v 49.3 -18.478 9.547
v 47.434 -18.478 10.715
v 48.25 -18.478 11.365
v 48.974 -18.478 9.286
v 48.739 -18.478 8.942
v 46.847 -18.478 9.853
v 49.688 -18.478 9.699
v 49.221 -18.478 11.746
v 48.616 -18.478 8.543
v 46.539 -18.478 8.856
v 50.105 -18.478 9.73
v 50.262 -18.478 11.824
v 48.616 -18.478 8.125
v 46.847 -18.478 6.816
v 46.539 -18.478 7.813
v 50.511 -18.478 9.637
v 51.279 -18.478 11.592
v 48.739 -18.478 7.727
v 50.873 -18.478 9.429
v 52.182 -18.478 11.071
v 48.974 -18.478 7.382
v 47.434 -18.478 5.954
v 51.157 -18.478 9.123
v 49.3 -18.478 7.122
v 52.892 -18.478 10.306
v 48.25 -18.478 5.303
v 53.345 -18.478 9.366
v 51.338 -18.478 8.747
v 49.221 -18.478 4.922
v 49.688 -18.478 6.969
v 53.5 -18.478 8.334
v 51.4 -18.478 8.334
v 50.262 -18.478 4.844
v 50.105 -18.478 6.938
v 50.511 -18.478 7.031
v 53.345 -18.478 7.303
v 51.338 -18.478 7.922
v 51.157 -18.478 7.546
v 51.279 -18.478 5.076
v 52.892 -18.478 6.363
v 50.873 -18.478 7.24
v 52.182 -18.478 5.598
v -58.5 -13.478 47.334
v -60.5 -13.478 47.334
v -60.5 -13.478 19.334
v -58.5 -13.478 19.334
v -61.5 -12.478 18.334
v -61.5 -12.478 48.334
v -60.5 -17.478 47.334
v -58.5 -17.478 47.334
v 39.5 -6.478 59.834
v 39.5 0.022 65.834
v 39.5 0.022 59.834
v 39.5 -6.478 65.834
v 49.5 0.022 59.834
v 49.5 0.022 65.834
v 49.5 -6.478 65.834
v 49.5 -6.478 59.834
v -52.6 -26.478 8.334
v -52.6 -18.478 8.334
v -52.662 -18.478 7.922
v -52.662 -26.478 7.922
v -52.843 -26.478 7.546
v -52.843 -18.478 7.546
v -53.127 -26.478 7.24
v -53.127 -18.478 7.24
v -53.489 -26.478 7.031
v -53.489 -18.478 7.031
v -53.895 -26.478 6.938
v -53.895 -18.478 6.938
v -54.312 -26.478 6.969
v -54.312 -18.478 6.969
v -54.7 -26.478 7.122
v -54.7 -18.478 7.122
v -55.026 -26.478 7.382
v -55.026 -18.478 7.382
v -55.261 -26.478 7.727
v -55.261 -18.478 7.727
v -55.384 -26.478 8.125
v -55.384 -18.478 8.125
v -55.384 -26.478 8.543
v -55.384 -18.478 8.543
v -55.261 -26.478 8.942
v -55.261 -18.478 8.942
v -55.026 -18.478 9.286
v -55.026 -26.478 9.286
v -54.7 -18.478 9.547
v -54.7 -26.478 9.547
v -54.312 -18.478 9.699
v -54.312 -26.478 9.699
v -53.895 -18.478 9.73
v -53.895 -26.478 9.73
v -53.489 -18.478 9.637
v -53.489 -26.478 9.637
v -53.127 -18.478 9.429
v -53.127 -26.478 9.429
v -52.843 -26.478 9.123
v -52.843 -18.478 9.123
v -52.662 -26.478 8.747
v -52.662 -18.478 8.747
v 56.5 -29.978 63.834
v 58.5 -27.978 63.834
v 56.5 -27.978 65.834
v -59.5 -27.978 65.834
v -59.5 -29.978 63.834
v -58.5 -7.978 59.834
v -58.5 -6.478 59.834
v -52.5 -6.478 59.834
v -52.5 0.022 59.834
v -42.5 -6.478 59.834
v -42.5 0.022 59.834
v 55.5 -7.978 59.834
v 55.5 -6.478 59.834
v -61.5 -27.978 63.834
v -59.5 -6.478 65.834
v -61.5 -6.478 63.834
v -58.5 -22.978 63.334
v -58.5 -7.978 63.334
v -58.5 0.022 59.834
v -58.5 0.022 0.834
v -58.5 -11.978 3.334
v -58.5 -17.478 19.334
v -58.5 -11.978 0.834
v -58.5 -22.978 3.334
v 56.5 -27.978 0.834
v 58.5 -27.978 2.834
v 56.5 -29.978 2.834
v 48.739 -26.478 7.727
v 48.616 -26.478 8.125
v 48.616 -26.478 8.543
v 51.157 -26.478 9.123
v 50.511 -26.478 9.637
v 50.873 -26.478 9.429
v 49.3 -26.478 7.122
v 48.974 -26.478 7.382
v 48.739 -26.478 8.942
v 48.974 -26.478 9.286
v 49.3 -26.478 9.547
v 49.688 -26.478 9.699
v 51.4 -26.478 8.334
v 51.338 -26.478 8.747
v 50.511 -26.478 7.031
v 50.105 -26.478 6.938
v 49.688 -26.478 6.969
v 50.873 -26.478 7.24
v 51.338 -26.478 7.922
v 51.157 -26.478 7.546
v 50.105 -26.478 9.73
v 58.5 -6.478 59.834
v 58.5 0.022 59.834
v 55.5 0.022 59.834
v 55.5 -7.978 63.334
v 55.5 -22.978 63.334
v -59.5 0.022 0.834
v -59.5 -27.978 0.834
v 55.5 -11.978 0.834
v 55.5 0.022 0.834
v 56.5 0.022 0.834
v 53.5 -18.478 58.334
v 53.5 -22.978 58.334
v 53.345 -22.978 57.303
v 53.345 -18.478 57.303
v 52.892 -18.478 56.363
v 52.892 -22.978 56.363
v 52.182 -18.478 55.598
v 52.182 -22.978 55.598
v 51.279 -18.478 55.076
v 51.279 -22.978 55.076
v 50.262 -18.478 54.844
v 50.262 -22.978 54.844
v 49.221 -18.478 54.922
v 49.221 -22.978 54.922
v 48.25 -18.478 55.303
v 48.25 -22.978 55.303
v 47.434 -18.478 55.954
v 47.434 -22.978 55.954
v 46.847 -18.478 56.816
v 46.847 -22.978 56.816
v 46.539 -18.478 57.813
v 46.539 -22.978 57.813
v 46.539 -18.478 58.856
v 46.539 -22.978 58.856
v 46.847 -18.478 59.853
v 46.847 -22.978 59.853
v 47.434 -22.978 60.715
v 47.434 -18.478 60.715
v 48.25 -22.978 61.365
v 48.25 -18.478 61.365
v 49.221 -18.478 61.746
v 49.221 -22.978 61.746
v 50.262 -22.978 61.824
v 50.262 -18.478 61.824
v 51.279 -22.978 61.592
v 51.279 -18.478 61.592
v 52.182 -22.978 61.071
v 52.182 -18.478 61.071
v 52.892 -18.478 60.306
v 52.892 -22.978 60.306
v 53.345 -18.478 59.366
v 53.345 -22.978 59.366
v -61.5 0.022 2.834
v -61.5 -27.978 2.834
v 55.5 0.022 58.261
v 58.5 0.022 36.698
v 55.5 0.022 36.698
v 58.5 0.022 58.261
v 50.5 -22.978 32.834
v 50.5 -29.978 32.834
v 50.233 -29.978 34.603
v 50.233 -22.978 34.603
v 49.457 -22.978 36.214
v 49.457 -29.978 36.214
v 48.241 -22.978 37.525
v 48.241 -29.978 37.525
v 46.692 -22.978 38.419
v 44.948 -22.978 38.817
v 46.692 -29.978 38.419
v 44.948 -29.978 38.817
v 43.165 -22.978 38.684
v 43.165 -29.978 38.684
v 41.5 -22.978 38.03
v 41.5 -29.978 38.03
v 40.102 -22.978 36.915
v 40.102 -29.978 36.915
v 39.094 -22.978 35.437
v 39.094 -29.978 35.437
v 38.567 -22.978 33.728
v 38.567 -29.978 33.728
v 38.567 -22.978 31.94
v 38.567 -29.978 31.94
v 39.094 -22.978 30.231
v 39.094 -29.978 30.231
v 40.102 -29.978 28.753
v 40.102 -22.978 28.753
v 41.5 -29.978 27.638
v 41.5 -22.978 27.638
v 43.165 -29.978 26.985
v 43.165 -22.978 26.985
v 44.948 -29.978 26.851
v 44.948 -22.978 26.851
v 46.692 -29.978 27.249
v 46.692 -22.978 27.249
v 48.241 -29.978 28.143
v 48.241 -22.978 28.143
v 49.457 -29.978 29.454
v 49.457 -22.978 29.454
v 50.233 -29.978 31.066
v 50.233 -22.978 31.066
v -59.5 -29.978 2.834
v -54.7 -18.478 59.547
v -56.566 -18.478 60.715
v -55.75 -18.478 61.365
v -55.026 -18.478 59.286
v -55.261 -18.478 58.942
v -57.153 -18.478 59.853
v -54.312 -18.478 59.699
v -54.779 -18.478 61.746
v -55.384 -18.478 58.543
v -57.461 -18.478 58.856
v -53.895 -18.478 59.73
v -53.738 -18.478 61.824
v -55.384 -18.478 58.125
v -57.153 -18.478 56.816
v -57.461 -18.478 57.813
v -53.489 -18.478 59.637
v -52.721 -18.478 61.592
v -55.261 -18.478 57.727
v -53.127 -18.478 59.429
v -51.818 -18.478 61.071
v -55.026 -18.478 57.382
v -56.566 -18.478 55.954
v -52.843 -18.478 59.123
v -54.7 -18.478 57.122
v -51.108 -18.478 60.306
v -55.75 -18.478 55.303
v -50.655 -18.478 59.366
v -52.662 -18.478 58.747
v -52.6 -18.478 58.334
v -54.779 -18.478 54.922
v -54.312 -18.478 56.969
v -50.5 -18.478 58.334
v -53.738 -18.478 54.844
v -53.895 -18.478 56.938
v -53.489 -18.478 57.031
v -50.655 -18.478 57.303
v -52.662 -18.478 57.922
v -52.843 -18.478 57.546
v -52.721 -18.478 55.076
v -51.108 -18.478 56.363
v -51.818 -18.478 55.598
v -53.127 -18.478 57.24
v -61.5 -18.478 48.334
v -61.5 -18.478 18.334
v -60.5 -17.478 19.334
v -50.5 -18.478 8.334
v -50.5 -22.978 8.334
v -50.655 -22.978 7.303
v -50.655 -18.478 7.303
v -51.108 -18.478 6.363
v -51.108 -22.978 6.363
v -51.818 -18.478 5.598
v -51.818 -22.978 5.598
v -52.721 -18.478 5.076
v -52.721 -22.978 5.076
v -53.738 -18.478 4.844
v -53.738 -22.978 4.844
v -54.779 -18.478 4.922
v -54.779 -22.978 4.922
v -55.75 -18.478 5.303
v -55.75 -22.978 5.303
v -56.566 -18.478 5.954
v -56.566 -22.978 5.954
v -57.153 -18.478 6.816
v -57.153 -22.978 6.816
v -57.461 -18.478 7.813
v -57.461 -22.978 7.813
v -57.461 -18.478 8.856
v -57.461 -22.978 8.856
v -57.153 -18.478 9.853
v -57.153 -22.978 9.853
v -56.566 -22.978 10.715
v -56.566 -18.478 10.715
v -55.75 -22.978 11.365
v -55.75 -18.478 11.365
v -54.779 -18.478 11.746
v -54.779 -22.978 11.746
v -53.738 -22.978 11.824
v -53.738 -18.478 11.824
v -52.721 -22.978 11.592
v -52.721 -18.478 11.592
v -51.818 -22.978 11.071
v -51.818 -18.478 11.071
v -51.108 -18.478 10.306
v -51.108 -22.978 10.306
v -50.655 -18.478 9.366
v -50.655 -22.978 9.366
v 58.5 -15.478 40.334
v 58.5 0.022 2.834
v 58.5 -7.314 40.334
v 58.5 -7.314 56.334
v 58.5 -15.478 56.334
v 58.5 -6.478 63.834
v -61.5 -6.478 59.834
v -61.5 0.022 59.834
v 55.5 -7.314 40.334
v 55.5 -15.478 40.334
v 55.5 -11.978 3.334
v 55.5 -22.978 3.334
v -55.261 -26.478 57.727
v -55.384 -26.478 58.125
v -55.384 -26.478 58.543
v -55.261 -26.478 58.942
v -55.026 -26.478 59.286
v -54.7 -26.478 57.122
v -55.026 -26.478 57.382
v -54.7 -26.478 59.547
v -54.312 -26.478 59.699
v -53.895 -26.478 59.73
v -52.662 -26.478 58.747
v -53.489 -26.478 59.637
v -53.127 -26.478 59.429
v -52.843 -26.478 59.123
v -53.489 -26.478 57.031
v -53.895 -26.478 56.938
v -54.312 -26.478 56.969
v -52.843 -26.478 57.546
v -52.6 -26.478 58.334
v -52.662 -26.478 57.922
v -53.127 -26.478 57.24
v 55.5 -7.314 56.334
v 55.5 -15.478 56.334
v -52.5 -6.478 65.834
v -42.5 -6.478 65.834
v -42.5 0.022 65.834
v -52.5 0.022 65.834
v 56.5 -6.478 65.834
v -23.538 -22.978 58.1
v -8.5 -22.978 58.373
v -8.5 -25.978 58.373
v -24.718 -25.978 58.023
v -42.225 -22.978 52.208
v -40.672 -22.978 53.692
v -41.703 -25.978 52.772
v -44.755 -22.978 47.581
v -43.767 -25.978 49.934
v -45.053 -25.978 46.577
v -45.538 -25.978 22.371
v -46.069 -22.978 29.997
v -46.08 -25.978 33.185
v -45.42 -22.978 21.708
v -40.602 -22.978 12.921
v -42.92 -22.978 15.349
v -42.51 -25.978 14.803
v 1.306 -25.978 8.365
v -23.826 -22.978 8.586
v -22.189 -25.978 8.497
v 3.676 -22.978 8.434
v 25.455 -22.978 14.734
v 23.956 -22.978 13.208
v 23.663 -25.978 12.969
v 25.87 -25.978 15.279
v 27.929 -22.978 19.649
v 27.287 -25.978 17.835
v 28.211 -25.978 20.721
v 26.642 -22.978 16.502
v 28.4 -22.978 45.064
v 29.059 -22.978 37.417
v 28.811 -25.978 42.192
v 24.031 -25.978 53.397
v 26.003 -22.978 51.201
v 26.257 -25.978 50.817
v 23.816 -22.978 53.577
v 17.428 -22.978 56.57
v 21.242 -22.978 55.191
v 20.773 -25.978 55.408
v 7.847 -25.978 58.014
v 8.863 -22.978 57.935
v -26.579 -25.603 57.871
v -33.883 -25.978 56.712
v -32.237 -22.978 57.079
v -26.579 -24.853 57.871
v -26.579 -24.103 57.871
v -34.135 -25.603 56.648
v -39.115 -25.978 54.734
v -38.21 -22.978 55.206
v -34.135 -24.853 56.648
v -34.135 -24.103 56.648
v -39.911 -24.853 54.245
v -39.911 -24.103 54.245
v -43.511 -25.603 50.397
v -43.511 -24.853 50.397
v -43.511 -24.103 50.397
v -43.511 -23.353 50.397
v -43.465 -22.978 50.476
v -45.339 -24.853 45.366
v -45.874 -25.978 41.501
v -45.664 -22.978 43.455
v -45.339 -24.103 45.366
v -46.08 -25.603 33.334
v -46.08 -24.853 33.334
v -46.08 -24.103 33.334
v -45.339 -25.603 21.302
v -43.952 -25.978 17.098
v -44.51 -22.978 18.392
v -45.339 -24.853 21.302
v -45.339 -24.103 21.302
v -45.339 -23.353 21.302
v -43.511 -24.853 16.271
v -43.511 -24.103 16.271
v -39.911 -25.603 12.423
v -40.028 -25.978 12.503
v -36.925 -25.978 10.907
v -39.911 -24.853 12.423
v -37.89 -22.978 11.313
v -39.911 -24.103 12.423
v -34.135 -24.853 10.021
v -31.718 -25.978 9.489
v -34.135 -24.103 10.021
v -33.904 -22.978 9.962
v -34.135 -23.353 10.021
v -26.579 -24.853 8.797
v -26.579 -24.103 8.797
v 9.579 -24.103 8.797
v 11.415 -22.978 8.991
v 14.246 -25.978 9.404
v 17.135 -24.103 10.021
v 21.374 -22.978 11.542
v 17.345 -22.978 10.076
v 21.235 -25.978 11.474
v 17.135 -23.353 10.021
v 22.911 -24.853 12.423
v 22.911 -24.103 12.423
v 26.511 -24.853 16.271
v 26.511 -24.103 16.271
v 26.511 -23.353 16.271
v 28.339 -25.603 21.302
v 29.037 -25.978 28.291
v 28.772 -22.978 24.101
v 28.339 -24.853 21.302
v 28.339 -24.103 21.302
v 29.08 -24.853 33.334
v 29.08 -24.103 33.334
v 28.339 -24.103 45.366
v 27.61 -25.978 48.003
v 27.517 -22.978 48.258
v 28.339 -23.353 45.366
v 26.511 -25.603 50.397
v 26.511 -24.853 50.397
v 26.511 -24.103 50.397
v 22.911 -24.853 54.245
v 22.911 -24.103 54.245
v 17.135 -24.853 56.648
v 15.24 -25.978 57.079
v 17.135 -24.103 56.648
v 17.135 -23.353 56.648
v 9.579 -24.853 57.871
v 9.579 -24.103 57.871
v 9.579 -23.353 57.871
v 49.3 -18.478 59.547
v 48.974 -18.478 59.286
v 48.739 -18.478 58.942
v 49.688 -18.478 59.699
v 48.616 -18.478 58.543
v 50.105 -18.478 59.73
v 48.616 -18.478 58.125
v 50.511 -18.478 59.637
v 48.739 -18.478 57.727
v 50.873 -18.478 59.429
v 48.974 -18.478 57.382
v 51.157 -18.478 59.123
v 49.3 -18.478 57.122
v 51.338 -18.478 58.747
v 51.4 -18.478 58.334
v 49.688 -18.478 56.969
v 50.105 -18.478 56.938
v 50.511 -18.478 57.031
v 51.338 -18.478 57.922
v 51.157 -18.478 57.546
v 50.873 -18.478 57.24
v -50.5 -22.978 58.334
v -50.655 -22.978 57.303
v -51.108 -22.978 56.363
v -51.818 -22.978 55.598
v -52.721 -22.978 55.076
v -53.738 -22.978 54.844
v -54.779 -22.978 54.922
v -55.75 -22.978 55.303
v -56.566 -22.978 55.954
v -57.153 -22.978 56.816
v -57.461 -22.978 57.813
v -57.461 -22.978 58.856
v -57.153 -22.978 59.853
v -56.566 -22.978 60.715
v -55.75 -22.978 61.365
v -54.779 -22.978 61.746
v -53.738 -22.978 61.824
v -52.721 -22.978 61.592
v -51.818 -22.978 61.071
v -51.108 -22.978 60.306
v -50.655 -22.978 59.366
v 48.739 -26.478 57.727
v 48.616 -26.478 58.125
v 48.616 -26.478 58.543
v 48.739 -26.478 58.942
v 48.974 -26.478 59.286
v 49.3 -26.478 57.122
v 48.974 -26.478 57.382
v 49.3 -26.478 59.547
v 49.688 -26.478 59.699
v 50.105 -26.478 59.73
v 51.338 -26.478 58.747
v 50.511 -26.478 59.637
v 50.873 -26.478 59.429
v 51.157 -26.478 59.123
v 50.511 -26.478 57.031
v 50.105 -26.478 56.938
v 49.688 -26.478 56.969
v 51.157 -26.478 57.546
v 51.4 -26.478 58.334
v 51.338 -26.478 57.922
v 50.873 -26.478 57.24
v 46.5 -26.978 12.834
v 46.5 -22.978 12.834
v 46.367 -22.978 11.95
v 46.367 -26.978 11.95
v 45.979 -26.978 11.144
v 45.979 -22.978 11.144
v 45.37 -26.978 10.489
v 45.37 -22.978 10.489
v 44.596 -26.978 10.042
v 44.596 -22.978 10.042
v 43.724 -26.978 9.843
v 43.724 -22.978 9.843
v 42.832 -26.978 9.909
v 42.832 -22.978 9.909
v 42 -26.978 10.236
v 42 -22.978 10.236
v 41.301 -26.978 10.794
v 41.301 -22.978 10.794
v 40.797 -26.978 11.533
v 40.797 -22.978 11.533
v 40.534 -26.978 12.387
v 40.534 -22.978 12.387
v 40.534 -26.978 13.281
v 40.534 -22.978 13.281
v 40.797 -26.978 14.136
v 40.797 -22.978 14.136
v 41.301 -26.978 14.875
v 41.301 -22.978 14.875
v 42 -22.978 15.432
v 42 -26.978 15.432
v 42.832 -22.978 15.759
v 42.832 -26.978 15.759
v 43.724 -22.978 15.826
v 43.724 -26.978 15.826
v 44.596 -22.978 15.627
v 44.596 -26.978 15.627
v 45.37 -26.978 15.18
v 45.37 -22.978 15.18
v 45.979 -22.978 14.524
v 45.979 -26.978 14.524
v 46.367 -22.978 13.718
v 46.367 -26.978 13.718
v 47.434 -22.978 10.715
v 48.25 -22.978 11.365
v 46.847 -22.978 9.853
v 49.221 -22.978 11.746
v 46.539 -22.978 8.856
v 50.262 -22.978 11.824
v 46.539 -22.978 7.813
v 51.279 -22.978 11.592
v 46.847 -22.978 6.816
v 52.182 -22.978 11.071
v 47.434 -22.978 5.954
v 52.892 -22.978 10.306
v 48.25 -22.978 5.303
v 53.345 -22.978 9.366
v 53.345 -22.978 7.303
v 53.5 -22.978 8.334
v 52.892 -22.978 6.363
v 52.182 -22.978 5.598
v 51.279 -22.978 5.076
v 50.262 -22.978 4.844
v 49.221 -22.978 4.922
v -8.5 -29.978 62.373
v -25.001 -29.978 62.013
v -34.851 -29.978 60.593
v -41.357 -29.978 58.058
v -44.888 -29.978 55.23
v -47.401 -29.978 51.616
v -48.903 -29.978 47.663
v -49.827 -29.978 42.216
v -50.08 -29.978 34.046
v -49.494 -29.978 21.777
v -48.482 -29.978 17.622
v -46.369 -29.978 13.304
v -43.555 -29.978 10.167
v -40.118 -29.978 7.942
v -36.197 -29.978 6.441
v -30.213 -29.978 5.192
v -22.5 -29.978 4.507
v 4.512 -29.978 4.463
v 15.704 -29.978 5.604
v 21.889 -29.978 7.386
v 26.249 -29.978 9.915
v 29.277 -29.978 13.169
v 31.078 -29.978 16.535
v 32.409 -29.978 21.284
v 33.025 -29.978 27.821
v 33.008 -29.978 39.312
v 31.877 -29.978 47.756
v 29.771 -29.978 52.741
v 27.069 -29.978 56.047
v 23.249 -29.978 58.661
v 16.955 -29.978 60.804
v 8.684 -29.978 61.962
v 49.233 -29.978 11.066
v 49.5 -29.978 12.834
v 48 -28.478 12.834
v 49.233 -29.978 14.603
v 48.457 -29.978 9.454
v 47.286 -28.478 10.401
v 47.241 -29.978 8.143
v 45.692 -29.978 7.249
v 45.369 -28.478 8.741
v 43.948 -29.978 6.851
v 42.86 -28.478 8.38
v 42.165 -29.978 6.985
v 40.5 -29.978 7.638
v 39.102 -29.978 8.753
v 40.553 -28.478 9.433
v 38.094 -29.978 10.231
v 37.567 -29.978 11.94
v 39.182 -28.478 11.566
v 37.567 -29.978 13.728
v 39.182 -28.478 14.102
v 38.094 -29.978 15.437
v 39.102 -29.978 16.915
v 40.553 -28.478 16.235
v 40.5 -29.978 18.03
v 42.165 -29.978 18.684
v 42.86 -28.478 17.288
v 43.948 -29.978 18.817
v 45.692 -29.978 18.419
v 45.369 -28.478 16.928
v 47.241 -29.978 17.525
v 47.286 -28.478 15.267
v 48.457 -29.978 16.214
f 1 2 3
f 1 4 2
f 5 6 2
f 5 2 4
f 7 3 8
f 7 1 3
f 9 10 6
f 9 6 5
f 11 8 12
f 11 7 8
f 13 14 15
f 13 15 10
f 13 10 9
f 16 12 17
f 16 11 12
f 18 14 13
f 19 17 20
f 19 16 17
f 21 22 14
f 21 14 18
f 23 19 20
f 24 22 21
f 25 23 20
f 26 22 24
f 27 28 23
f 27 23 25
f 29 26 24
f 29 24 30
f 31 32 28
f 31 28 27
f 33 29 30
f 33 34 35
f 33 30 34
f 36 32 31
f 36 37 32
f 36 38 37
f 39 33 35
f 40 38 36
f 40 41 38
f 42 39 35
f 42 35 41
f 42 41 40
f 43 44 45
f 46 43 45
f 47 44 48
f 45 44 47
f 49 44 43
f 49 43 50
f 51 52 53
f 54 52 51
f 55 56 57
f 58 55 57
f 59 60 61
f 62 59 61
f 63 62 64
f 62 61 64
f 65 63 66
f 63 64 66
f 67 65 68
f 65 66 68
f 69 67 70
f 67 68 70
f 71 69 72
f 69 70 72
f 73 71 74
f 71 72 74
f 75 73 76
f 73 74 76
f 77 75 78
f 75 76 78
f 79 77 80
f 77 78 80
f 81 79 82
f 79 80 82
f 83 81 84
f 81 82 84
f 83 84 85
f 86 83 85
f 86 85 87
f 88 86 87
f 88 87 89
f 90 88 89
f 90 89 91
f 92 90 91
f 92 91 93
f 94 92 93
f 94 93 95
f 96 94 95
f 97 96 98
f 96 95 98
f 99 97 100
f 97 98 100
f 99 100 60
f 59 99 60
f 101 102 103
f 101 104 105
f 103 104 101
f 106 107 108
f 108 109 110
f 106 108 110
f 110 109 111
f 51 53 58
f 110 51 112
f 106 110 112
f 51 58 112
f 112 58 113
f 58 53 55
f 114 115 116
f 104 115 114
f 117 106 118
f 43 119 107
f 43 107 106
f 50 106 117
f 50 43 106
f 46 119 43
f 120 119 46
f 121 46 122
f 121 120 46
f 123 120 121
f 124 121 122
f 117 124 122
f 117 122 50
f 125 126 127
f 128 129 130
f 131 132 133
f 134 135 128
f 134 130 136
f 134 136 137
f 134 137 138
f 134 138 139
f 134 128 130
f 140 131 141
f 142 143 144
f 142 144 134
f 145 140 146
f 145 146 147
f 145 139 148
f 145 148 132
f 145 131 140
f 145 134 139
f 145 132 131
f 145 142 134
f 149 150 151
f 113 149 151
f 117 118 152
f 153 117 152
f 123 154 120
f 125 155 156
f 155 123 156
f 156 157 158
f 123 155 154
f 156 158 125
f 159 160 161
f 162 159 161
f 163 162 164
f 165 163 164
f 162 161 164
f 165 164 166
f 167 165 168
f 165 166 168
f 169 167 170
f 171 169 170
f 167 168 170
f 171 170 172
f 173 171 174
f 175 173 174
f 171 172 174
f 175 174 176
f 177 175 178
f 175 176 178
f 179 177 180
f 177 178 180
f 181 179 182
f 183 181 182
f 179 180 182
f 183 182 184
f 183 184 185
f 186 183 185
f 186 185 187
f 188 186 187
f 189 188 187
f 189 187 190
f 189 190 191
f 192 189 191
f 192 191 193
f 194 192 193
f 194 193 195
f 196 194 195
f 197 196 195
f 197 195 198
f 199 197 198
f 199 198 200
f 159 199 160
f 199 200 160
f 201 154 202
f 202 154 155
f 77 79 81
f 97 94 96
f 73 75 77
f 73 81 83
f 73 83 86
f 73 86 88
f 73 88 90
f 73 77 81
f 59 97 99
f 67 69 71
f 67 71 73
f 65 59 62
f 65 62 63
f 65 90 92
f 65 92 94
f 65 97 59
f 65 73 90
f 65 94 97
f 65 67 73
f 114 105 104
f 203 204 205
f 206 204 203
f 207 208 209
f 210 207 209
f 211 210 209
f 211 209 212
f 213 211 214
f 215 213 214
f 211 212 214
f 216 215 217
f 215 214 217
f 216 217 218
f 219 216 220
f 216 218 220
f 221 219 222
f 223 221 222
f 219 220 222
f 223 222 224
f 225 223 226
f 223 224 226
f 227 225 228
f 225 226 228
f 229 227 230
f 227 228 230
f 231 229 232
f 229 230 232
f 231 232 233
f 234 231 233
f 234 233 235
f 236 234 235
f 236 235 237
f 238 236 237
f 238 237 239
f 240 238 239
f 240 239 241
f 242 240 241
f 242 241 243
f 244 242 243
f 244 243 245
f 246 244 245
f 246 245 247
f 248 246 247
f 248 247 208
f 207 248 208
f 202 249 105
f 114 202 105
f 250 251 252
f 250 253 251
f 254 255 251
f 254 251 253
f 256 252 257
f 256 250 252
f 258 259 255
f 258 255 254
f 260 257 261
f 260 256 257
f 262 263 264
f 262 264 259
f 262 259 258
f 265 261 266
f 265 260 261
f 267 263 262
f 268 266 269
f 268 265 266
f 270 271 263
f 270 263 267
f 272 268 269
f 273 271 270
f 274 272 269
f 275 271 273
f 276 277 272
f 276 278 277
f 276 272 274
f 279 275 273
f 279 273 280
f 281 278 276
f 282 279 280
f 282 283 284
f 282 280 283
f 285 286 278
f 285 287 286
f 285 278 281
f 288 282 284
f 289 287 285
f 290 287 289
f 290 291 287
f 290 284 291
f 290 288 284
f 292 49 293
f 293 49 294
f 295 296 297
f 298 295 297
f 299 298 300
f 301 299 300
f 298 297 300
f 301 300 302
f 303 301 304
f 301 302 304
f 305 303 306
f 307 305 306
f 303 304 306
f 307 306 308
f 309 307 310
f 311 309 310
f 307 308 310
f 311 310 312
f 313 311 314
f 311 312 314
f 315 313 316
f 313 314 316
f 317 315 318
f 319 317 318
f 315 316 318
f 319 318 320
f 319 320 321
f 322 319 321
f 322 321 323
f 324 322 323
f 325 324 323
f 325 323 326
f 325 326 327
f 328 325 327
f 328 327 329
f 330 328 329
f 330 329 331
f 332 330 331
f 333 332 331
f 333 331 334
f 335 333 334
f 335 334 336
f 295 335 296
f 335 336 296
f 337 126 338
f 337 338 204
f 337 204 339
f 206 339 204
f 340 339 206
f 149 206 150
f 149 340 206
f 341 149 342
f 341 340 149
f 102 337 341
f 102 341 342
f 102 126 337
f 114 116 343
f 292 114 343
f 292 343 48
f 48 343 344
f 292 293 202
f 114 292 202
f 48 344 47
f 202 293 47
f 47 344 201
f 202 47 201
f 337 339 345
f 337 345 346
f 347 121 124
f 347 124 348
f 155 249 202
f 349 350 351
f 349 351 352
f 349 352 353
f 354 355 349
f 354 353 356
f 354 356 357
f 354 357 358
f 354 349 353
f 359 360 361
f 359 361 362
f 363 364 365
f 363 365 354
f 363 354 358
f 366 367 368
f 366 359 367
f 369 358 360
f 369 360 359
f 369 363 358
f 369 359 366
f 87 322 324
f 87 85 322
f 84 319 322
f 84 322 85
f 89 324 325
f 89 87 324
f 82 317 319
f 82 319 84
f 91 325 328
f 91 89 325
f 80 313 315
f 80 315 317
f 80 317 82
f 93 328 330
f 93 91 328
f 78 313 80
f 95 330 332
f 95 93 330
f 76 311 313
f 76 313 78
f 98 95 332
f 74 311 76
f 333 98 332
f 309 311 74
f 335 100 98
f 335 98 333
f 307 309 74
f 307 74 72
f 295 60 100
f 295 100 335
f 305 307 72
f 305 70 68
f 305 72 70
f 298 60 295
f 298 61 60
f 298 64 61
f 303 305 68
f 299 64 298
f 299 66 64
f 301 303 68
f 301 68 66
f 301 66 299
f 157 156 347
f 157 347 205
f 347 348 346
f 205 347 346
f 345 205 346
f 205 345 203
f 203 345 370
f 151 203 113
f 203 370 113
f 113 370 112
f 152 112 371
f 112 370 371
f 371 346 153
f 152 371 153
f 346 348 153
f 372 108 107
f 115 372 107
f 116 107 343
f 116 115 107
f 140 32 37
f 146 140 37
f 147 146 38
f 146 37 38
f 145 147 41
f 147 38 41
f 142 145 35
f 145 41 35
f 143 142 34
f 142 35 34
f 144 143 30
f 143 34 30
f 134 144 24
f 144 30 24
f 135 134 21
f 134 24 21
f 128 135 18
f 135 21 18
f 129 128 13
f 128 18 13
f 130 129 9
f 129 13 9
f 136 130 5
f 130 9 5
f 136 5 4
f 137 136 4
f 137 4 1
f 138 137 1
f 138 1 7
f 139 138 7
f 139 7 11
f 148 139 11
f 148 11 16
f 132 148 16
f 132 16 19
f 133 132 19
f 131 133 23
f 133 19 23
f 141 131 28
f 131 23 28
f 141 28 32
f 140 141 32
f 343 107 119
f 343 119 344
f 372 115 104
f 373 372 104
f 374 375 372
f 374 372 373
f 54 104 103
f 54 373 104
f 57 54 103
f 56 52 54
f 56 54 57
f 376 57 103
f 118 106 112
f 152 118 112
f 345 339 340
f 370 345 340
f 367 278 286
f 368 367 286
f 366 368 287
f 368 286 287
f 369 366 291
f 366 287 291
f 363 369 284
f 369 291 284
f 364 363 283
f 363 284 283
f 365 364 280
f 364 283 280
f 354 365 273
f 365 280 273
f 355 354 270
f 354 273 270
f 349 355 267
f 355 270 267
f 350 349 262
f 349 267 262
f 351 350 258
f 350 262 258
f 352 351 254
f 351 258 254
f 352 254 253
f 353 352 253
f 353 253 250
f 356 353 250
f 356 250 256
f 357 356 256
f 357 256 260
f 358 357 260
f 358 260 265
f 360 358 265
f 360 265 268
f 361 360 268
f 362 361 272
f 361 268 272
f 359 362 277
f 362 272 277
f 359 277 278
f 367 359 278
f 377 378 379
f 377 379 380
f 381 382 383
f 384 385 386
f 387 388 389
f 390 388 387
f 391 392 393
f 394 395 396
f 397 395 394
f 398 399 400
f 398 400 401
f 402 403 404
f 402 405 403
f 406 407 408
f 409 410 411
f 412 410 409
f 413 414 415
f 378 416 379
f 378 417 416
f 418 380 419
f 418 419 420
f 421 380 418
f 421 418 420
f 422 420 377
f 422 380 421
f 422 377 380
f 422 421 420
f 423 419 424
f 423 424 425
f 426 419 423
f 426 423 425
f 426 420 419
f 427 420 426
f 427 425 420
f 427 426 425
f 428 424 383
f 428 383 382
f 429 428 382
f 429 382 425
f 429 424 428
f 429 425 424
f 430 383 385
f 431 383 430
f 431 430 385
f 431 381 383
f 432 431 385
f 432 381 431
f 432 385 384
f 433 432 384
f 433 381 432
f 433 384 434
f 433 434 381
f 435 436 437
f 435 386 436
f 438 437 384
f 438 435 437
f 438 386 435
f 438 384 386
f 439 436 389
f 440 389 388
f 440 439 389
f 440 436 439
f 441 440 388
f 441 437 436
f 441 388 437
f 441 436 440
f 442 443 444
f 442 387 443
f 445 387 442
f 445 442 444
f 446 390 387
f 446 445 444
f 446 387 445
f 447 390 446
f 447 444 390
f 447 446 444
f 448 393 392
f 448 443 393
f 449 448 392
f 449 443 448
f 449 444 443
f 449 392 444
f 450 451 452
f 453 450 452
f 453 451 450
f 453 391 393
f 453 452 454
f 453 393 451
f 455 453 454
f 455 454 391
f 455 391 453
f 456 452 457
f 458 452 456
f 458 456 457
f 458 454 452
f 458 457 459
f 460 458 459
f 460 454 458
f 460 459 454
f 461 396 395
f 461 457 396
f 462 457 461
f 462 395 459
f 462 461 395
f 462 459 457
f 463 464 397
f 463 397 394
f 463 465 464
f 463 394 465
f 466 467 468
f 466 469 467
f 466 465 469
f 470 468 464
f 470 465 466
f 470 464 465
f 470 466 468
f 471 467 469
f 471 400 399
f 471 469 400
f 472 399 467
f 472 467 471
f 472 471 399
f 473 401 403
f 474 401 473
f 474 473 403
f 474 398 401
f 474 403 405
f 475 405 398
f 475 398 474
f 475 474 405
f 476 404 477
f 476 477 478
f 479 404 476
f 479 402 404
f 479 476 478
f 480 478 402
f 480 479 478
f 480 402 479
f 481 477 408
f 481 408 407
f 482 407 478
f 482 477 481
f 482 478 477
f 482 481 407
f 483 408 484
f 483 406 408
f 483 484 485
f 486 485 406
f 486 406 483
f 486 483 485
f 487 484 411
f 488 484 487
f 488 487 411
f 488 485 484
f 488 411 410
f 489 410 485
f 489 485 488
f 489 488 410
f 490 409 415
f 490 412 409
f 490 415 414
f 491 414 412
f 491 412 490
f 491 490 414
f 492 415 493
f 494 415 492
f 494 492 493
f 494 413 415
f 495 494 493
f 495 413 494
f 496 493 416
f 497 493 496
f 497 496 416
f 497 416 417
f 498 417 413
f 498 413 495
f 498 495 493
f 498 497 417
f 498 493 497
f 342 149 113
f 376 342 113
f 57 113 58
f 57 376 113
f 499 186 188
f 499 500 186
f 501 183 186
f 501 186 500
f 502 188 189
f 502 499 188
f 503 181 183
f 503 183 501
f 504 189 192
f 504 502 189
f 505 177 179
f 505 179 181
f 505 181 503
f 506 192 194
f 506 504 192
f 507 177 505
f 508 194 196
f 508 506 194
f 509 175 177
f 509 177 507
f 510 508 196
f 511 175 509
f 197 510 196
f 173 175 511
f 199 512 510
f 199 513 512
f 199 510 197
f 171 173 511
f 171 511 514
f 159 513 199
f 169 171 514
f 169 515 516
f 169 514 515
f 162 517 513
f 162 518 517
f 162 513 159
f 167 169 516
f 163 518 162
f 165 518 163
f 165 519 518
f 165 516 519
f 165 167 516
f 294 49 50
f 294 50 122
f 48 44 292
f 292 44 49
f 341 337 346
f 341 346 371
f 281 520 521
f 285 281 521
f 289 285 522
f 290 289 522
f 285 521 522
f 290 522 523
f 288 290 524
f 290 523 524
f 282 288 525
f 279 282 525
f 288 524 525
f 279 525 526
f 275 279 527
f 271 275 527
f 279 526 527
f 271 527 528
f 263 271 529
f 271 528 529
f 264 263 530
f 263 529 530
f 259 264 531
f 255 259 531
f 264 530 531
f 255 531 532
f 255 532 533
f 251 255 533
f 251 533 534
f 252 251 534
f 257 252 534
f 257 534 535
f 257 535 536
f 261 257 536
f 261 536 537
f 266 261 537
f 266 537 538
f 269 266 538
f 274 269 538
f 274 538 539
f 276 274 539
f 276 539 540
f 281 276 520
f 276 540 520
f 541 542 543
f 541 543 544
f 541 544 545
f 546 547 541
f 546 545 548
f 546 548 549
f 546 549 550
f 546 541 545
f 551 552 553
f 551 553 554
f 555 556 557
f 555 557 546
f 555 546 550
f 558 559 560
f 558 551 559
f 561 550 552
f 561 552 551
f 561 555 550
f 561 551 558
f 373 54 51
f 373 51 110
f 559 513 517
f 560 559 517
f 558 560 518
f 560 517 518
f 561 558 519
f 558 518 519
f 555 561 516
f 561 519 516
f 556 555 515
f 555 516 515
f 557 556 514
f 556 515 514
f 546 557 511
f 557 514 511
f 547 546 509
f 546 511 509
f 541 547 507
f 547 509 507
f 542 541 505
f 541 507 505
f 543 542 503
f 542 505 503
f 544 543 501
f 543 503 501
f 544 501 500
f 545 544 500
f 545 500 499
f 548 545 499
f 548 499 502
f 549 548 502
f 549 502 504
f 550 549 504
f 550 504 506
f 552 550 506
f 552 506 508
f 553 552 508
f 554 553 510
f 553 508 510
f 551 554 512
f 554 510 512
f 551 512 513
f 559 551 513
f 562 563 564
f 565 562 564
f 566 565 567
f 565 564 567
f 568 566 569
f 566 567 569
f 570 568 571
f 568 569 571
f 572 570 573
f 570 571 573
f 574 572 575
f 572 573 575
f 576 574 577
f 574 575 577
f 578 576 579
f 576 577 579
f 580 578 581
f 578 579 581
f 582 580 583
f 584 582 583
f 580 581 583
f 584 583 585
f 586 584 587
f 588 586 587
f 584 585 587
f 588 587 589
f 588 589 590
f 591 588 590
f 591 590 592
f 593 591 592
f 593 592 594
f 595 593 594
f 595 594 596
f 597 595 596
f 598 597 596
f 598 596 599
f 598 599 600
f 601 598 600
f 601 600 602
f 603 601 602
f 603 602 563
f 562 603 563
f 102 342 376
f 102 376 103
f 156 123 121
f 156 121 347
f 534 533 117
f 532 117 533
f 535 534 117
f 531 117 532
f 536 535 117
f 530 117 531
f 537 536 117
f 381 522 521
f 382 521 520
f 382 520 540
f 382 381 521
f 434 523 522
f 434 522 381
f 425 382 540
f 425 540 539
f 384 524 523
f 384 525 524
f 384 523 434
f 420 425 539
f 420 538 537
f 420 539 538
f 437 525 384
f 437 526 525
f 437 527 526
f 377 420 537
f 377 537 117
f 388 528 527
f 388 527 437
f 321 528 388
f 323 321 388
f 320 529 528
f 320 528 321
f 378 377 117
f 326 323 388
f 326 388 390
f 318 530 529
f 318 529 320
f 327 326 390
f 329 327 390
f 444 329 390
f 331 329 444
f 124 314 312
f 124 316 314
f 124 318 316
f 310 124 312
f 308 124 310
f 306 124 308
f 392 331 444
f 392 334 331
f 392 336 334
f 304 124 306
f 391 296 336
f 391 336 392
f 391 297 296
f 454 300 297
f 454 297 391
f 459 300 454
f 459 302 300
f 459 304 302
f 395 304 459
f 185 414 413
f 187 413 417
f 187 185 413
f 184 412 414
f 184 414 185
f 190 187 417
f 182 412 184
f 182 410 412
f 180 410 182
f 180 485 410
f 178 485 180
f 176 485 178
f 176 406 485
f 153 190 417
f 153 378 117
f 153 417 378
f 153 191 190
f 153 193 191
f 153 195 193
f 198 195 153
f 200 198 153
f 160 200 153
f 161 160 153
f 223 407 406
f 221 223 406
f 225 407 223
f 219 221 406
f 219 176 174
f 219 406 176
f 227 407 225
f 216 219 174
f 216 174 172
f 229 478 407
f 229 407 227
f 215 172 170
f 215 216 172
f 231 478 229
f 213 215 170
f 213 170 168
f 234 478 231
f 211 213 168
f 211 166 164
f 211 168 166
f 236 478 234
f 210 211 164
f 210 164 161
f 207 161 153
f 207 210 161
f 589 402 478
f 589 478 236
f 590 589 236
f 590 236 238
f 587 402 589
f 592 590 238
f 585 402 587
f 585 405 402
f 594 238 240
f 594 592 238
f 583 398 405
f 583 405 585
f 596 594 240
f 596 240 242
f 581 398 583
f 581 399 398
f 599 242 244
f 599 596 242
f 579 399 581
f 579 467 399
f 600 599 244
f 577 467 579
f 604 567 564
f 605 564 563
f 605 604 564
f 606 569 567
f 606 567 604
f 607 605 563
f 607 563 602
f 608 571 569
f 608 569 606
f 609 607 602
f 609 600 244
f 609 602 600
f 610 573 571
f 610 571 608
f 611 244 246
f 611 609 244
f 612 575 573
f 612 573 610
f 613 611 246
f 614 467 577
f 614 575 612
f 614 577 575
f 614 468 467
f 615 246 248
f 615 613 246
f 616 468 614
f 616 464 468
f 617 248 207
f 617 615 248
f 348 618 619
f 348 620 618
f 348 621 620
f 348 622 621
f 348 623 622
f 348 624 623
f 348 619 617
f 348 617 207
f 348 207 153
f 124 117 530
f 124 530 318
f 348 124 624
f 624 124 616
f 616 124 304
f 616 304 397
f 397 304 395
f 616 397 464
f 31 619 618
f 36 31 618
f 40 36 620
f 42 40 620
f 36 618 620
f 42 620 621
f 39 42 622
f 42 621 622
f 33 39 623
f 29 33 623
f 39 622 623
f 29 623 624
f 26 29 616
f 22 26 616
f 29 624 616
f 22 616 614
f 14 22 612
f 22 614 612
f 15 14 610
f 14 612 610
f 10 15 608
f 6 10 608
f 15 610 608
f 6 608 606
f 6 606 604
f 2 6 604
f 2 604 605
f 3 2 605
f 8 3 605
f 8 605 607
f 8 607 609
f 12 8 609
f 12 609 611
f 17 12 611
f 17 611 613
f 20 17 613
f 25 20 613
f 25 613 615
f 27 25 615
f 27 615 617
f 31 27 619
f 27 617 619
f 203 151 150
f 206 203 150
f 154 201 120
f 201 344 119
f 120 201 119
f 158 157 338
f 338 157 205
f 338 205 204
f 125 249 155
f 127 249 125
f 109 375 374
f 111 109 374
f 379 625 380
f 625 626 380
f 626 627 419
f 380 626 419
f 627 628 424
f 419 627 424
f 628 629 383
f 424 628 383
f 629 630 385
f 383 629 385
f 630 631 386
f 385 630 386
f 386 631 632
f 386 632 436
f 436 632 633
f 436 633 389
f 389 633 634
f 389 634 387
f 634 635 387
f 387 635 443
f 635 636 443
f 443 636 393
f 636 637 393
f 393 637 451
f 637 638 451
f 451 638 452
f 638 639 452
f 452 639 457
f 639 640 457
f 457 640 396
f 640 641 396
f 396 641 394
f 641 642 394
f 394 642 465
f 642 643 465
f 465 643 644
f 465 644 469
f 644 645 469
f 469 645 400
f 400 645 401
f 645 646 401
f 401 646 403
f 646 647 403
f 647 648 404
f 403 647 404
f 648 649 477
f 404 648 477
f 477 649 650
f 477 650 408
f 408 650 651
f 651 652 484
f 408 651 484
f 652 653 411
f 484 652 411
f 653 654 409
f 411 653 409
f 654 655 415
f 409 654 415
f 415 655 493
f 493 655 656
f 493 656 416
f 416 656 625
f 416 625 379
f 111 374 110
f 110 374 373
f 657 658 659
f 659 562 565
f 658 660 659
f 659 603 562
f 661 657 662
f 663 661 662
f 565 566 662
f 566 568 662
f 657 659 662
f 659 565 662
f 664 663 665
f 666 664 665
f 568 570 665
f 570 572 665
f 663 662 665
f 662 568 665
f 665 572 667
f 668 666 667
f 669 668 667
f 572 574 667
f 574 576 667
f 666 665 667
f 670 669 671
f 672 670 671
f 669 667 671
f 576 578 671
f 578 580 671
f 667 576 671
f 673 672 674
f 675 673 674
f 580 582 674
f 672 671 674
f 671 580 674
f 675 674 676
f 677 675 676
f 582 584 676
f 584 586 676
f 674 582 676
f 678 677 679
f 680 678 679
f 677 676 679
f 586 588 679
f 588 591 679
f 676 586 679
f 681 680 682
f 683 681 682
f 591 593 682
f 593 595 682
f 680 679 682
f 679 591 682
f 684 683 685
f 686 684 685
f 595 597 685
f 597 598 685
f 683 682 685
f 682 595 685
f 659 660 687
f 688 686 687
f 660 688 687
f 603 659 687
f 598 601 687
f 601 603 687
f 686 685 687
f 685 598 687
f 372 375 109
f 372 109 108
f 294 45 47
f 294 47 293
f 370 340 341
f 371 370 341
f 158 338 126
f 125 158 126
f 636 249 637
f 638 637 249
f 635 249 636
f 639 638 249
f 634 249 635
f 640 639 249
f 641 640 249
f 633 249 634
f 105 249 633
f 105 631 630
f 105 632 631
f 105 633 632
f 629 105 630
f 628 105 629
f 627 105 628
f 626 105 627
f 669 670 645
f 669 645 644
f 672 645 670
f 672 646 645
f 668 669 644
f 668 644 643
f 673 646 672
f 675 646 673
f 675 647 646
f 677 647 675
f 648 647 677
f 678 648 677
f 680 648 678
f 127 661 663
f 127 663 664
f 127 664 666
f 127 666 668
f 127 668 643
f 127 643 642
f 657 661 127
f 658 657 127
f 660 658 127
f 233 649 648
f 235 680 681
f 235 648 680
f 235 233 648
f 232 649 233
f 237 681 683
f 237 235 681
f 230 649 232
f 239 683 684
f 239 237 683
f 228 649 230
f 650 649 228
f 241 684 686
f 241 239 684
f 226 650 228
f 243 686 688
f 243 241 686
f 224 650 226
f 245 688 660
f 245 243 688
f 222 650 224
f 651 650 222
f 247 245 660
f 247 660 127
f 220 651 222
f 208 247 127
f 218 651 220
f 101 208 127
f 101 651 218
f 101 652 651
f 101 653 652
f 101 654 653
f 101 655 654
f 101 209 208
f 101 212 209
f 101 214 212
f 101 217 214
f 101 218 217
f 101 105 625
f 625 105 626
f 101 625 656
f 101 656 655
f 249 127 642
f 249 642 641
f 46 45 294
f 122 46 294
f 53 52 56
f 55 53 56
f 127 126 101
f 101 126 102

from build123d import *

# Parameters (mm, degrees)
SKETCH029_W             = 120
SKETCH029_H             = 65
PAD005_DEPTH            = 30
SKETCH028_R             = 3
POCKET016_DEPTH         = 30.001
SKETCH001_R             = 6
POCKET017_DEPTH         = 30.001
SKETCH030_W             = 114
SKETCH030_H             = 60
POCKET018_DEPTH         = 23
CHAMFER001_SIZE         = 4
SKETCH031_R             = 3.5
PAD006_DEPTH            = 4.5
SKETCH032_R             = 1.4
POCKET019_DEPTH         = 8
SKETCH033_W             = 16
SKETCH033_H             = 15.5
POCKET020_DEPTH         = 9
SKETCH034_W             = 28
SKETCH034_H             = 4
POCKET021_DEPTH         = 5
SKETCH047_W             = 114
SKETCH047_H             = 19.272015
POCKET_DEPTH            = 5
SKETCH048_W             = 120
SKETCH048_H             = 5.5
PAD007_DEPTH            = 8
SKETCH_W                = 11.731236
SKETCH_H                = 12.876318
SKETCH_W_2              = 82
SKETCH_H_2              = 15.5631
SKETCH_W_3              = 12.49527
SKETCH_H_3              = 12.557034
POCKET032_DEPTH         = 6
CHAMFER_SIZE            = 2
CHAMFER002_SIZE         = 1
CHAMFER003_SIZE         = 3
SKETCH054_W             = 21.563645
SKETCH054_H             = 7.336093
PAD008_DEPTH            = 3
BODY002_PLACEMENT_ANGLE = 270


with BuildPart() as part:
    # Sketch029 → Pad005 (new body)
    with BuildSketch(Plane.XY):
        with Locations((7, 0)):
            Rectangle(SKETCH029_W, SKETCH029_H)
        with BuildLine():
            add(Edge.make_bspline(
                [(0, 25.038668), (-12.580271, 25.038668), (-37.740814, 25.116003), (-37.5, 0), (-37.740814, -25.116003), (0, -25), (37.740814, -25.116003), (37.5, 0), (37.740814, 25.116003), (12.580271, 25.038668), (0, 25.038668)],
                knots=[0, 0, 0, 0, 0.125, 0.25, 0.375, 0.5, 0.625, 0.75, 0.875, 1, 1, 1, 1], degree=3))
        make_face(mode=Mode.SUBTRACT)
    extrude(amount=PAD005_DEPTH)

    # Sketch028 → Pocket016 (cut, through all)
    with BuildSketch(Plane(origin=(0, 0, 0), x_dir=(1, 0, 0), z_dir=(0, 0, -1))):
        with Locations((52, 20.5)):
            Circle(SKETCH028_R)
    extrude(amount=-POCKET016_DEPTH, mode=Mode.SUBTRACT)

    # Sketch001 (on Face5 of Pocket016) → Pocket017 (cut, through all)
    with BuildSketch(Plane.XY.offset(30)):
        with Locations((53, -0.5)):
            Circle(SKETCH001_R)
    extrude(amount=-POCKET017_DEPTH, mode=Mode.SUBTRACT)

    # Sketch030 (on Face4 of Pocket017) → Pocket018 (cut)
    with BuildSketch(Plane(origin=(0, 0, 0), x_dir=(1, 0, 0), z_dir=(0, 0, -1))):
        with Locations((7, 0)):
            Rectangle(SKETCH030_W, SKETCH030_H)
    extrude(amount=-POCKET018_DEPTH, mode=Mode.SUBTRACT)

    # Chamfer001
    chamfer001_edges = [part.edges().sort_by_distance(p)[0] for p in [
        (0, -25.038668, 30),
    ]]
    chamfer(chamfer001_edges, length=CHAMFER001_SIZE)

    # Sketch031 (on Face11 of Chamfer001) → Pad006 (join)
    with BuildSketch(Plane(origin=(0, 0, 23), x_dir=(1, 0, 0), z_dir=(0, 0, -1))):
        with Locations((-45.5, 25)):
            Circle(SKETCH031_R)
        with Locations((-45.5, -25)):
            Circle(SKETCH031_R)
        with Locations((58.5, -25)):
            Circle(SKETCH031_R)
        with Locations((58.5, 25)):
            Circle(SKETCH031_R)
    extrude(amount=PAD006_DEPTH)

    # Sketch032 (on Face22 of Pad006) → Pocket019 (cut)
    with BuildSketch(Plane(origin=(0, 0, 18.5), x_dir=(1, 0, 0), z_dir=(0, 0, -1))):
        with Locations((-45.5, 25)):
            Circle(SKETCH032_R)
        with Locations((58.5, 25)):
            Circle(SKETCH032_R)
        with Locations((58.5, -25)):
            Circle(SKETCH032_R)
        with Locations((-45.5, -25)):
            Circle(SKETCH032_R)
    extrude(amount=-POCKET019_DEPTH, mode=Mode.SUBTRACT)

    # Sketch033 (on Face5 of Pocket019) → Pocket020 (cut)
    with BuildSketch(Plane.YZ.offset(67)):
        with Locations((15, 7.75)):
            Rectangle(SKETCH033_W, SKETCH033_H)
    extrude(amount=-POCKET020_DEPTH, mode=Mode.SUBTRACT)

    # Sketch034 (on Face4 of Pocket020) → Pocket021 (cut)
    with BuildSketch(Plane(origin=(-53, 0, 0), x_dir=(0, -1, 0), z_dir=(-1, 0, 0))):
        with Locations((0, 15.5)):
            Rectangle(SKETCH034_W, SKETCH034_H)
    extrude(amount=-POCKET021_DEPTH, mode=Mode.SUBTRACT)

    # Sketch047 (on Face6 of Pocket021) → Pocket (cut)
    with BuildSketch(Plane.XZ.offset(32.5)):
        with Locations((7, 2.363993)):
            Rectangle(SKETCH047_W, SKETCH047_H)
    extrude(amount=-POCKET_DEPTH, mode=Mode.SUBTRACT)

    # Sketch048 (on Face10 of Pocket) → Pad007 (join)
    with BuildSketch(Plane(origin=(0, 0, 0), x_dir=(1, 0, 0), z_dir=(0, 0, -1))):
        with Locations((7, -29.25)):
            Rectangle(SKETCH048_W, SKETCH048_H)
    extrude(amount=-PAD007_DEPTH)

    # Sketch (on Face3 of Pocket) → Pocket032 (cut)
    with BuildSketch(Plane(origin=(0, 32.5, 0), x_dir=(-1, 0, 0), z_dir=(0, 1, 0))):
        with Locations((-63.865618, 0.061841)):
            Rectangle(SKETCH_W, SKETCH_H)
        with Locations((-7, -1.28155)):
            Rectangle(SKETCH_W_2, SKETCH_H_2)
        with Locations((50.247635, 0.221483)):
            Rectangle(SKETCH_W_3, SKETCH_H_3)
    extrude(amount=-POCKET032_DEPTH, mode=Mode.SUBTRACT)

    # Chamfer
    chamfer_edges = [part.edges().sort_by_distance(p)[0] for p in [
        (67, 32.5, 18.25),
        (67, 0, 30),
        (7, 32.5, 30),
        (67, -32.5, 15),
        (7, -32.5, 30),
        (-53, 0, 30),
        (-53, -32.5, 15),
        (-53, 32.5, 18.25),
    ]]
    chamfer(chamfer_edges, length=CHAMFER_SIZE)

    # Chamfer002
    chamfer002_edges = [part.edges().sort_by_distance(p)[0] for p in [
        (-53, 0, 17.5),
        (-53, 14, 15.5),
        (-53, 0, 13.5),
        (-53, -14, 15.5),
    ]]
    chamfer(chamfer002_edges, length=CHAMFER002_SIZE)

    # Chamfer003
    chamfer003_edges = [part.edges().sort_by_distance(p)[0] for p in [
        (49, -20.5, 30),
    ]]
    chamfer(chamfer003_edges, length=CHAMFER003_SIZE)

    # Sketch054 (on Face11 of Chamfer003) → Pad008 (join)
    with BuildSketch(Plane.YZ.offset(67)):
        with Locations((14.145369, 3.668046)):
            Rectangle(SKETCH054_W, SKETCH054_H)
    extrude(amount=-PAD008_DEPTH)


with BuildPart() as part_1:
    # Body002 placement: moved
    add(part.part.moved(Location((-8.5, 0.022108, 33.334158))).rotate(Axis((-8.5, 0.022108, 33.334158), (-1, 0, 0)), BODY002_PLACEMENT_ANGLE))


solid = part_1.part
